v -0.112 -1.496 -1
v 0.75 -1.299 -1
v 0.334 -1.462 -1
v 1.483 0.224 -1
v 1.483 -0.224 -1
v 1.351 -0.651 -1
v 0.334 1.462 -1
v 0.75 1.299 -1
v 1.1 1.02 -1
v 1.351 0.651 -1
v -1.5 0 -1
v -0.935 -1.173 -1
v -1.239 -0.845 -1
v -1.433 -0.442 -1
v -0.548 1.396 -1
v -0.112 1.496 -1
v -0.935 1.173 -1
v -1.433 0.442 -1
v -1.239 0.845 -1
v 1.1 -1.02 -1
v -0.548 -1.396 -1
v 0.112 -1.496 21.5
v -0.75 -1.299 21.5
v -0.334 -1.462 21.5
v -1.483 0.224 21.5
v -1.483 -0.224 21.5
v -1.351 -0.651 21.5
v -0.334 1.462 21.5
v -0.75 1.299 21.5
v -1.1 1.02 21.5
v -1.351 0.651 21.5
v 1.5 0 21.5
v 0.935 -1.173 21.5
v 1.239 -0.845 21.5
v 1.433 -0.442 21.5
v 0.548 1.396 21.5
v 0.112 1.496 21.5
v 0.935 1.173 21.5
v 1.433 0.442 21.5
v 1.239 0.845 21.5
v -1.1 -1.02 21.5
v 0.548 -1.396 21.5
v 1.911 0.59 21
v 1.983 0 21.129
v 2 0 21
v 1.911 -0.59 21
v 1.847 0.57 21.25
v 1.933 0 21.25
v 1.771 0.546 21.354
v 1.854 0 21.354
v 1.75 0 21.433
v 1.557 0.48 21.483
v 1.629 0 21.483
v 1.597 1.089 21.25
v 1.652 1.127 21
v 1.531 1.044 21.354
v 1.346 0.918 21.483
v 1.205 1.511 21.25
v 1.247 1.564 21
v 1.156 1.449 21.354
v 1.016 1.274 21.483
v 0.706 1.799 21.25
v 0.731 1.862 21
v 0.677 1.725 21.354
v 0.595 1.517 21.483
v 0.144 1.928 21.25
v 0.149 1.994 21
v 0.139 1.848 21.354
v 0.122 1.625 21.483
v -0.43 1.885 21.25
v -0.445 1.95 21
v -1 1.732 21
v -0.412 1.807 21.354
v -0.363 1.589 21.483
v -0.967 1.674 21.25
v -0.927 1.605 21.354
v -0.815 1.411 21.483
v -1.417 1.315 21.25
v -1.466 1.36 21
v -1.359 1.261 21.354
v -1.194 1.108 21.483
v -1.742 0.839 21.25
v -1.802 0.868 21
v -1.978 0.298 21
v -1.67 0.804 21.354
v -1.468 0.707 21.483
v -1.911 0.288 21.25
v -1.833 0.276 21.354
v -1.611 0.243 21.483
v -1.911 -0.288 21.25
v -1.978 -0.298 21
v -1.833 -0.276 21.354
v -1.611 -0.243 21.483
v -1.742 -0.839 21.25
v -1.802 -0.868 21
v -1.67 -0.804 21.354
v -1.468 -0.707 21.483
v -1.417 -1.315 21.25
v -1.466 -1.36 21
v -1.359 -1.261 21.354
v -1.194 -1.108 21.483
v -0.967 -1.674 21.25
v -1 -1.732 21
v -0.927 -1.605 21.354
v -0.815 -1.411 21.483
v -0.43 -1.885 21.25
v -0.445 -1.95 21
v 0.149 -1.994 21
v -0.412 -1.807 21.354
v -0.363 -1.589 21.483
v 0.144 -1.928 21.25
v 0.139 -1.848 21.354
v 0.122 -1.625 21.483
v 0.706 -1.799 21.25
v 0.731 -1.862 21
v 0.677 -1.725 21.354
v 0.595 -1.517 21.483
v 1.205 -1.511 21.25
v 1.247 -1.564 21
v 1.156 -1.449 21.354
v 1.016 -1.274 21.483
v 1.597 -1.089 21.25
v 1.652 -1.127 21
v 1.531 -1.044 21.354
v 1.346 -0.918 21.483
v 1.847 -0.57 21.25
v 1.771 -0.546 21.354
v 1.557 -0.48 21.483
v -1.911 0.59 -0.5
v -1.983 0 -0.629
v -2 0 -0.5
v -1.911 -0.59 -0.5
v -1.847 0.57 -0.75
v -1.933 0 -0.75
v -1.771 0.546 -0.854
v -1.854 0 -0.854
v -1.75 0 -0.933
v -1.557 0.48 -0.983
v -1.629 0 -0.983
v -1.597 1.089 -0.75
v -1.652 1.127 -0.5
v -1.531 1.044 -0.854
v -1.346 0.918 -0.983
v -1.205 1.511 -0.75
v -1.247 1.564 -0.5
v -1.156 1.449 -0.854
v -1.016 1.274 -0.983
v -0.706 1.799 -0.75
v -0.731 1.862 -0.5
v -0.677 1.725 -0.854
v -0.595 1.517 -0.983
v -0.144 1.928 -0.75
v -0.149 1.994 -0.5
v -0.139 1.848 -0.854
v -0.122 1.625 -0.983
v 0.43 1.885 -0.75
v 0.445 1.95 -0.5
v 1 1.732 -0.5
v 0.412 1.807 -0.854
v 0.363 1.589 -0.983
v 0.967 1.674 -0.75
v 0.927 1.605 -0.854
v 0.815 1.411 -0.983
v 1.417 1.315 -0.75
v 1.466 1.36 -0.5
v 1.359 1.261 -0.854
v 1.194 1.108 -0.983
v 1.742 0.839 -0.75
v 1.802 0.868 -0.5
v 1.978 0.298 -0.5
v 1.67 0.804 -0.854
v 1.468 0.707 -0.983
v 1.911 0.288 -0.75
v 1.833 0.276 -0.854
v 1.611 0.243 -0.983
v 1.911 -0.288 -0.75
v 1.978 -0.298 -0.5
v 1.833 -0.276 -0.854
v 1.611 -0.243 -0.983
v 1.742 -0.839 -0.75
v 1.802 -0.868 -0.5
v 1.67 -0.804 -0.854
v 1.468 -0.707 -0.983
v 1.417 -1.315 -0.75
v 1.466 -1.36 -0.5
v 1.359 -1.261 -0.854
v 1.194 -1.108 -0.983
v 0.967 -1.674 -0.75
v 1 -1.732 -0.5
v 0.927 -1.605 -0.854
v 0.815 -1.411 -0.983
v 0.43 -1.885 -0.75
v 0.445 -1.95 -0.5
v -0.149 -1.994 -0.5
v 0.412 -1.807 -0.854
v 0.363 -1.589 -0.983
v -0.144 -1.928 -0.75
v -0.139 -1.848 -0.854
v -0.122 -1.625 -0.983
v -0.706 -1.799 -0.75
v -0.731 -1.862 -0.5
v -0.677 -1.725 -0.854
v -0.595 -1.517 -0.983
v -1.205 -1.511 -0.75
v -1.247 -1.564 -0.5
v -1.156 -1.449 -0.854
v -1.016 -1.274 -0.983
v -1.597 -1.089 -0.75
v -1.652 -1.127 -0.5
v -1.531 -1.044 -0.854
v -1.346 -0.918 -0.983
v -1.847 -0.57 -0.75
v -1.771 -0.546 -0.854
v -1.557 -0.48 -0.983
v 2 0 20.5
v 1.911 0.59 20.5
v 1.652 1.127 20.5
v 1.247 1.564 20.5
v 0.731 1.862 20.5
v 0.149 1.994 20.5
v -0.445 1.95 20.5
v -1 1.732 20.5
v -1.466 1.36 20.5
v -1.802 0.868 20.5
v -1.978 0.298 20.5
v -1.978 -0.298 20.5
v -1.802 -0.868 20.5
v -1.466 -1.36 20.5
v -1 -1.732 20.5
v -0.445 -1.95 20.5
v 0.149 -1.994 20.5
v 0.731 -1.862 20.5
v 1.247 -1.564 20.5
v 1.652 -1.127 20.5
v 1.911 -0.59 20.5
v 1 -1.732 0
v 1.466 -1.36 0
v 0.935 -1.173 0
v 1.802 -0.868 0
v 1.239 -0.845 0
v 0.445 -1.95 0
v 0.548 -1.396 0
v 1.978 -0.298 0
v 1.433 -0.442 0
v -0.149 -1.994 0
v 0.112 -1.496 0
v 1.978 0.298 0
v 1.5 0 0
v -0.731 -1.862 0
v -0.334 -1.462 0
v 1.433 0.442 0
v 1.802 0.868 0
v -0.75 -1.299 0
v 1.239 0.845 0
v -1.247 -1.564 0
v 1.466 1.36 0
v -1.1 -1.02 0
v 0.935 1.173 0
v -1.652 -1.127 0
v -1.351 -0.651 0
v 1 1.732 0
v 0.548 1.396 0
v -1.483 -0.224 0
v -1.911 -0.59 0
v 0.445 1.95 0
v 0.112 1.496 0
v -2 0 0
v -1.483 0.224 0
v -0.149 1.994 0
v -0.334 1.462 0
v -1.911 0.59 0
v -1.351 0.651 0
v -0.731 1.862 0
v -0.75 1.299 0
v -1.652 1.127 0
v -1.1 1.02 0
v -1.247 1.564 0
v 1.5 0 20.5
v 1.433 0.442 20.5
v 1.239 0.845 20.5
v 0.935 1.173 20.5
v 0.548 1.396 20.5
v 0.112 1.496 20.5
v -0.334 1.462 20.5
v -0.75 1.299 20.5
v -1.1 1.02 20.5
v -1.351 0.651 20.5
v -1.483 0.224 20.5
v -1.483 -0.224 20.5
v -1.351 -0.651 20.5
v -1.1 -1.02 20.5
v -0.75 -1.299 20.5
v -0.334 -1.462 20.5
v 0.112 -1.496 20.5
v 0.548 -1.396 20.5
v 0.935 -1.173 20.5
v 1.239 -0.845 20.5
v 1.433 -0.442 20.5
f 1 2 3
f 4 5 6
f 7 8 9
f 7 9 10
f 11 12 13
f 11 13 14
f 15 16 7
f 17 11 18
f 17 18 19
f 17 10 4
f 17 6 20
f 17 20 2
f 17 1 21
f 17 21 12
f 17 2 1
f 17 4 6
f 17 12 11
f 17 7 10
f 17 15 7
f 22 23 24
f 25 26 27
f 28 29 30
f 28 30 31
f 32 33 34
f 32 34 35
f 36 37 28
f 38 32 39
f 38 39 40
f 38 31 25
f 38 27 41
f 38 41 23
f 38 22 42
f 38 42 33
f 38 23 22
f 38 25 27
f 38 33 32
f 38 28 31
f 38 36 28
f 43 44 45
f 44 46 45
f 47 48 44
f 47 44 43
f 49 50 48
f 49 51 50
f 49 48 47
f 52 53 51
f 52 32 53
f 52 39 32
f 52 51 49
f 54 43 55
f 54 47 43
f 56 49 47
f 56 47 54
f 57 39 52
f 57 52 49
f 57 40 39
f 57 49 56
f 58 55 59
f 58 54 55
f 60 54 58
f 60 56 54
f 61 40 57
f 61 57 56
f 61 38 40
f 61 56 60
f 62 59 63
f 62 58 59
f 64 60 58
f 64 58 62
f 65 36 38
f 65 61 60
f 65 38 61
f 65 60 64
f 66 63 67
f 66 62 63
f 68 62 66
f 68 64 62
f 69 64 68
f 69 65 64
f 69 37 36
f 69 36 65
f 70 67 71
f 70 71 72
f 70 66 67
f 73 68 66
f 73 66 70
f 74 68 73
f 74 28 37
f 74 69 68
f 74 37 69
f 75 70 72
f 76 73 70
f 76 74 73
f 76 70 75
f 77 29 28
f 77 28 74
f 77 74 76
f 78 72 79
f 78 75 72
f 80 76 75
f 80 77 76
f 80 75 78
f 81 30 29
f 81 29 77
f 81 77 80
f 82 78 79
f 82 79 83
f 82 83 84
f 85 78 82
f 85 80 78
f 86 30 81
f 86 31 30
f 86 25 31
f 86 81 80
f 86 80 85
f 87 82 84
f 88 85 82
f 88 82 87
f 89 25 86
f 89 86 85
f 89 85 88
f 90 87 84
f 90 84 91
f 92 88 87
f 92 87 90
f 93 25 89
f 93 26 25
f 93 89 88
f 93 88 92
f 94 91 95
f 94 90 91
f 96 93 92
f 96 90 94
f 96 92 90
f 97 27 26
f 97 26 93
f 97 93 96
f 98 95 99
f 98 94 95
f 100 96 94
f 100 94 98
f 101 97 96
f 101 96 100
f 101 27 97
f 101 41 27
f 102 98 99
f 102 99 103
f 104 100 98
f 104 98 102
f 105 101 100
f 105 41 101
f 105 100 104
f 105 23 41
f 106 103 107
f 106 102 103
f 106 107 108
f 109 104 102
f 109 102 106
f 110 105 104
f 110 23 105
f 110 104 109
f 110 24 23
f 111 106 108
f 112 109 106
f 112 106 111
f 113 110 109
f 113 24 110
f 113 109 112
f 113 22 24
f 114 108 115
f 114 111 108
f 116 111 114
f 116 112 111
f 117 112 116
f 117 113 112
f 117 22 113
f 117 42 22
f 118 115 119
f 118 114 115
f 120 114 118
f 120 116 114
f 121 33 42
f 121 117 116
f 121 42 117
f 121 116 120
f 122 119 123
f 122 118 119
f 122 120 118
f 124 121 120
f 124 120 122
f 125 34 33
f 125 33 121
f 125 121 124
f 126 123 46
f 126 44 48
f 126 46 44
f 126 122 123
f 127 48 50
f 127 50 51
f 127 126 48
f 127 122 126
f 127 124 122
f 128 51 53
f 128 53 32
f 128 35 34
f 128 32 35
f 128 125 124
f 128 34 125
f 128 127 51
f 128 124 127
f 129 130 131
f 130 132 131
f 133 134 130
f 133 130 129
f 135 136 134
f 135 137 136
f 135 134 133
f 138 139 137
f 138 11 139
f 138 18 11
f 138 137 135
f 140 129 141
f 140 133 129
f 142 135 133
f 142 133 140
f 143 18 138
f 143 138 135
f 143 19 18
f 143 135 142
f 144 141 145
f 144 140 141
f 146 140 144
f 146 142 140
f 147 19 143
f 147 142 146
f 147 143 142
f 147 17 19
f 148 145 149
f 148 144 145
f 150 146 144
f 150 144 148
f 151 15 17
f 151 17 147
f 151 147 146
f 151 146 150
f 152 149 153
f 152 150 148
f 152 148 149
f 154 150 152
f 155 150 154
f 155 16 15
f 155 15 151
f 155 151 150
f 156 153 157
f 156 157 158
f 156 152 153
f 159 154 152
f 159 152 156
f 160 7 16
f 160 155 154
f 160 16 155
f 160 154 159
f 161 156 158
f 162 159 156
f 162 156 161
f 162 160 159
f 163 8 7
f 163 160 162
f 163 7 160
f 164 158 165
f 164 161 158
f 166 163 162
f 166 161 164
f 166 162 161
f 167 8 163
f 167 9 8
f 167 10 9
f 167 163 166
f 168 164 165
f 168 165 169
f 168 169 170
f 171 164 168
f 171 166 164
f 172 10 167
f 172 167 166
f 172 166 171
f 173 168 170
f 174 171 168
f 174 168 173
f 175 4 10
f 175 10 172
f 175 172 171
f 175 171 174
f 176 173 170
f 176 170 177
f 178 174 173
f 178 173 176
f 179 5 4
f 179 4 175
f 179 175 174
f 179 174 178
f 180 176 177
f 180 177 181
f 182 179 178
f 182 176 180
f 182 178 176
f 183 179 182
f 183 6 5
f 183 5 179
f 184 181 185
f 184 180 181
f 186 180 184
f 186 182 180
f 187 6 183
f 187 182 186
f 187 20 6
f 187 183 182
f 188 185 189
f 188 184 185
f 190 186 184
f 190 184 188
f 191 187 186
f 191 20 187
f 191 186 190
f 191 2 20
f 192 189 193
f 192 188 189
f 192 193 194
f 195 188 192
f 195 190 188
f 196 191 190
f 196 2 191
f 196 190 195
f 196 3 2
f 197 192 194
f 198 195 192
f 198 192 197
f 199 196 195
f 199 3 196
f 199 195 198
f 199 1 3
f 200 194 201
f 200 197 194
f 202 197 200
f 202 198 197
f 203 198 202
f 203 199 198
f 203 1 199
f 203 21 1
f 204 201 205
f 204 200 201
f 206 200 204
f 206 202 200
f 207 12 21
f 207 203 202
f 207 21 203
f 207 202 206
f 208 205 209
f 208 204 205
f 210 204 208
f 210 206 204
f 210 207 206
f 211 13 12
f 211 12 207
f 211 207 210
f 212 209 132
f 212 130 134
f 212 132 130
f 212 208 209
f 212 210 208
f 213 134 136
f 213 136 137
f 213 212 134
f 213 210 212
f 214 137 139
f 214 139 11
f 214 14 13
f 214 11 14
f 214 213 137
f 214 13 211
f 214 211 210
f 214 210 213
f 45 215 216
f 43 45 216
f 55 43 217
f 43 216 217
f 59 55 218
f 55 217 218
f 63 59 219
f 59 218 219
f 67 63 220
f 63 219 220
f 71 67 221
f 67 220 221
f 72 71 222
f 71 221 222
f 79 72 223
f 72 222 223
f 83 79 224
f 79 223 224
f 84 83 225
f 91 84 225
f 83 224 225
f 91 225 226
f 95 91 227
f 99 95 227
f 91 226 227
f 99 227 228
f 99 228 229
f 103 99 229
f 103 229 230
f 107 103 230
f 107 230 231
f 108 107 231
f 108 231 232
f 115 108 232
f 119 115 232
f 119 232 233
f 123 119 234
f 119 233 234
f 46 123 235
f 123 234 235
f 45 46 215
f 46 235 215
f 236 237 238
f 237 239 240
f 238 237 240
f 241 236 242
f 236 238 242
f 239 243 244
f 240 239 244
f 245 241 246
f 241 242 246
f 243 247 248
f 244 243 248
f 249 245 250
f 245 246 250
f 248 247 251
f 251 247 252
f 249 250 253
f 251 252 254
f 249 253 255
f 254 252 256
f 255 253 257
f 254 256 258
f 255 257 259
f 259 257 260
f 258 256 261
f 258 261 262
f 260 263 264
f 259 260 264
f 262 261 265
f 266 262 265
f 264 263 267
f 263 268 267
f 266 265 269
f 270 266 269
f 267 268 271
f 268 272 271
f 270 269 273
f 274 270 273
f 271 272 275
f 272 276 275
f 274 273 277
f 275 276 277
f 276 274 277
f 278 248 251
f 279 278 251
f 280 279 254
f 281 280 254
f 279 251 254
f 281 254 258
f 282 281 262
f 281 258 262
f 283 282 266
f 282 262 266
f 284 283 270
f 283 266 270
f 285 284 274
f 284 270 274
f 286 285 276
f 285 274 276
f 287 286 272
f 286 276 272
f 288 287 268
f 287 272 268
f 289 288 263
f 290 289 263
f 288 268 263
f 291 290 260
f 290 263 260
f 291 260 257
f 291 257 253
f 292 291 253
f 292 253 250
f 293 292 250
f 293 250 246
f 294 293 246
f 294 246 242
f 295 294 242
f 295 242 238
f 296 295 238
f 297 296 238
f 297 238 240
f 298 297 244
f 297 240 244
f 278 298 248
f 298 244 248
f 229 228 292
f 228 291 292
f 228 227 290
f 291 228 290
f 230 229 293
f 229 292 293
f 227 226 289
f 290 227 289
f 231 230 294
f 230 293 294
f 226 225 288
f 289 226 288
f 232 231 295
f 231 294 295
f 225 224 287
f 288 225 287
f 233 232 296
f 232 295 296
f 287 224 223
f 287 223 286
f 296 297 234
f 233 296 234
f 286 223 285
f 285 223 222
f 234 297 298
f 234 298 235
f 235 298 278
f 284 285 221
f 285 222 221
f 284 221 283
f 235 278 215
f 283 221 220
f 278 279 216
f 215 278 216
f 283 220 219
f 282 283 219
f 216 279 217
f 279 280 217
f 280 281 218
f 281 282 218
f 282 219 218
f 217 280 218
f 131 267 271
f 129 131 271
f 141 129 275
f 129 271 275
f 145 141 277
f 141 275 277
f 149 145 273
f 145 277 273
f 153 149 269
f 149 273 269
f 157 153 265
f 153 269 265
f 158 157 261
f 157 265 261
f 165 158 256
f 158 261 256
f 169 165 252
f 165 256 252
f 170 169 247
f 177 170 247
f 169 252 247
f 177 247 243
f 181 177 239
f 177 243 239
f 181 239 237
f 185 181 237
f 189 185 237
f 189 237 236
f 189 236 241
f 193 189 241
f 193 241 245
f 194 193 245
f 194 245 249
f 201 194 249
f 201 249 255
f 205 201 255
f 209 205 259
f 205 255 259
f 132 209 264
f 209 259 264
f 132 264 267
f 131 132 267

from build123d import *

# Parameters (mm, degrees)
SKETCH1_R           = 1.5
BOSS_EXTRUDE1_DEPTH = 20.5
SKETCH2_R           = 2
BOSS_EXTRUDE2_DEPTH = 1
SKETCH3_R           = 2
BOSS_EXTRUDE3_DEPTH = 1
FILLET1_R           = 0.5


with BuildPart() as part:
    # Sketch1 → Boss-Extrude1 (new body)
    with BuildSketch(Plane.XY):
        Circle(SKETCH1_R)
    extrude(amount=BOSS_EXTRUDE1_DEPTH)

    # Sketch2 → Boss-Extrude2 (add)
    with BuildSketch(Plane(origin=(0, 0, 0), x_dir=(-1, 0, 0), z_dir=(0, 0, -1))):
        Circle(SKETCH2_R)
    extrude(amount=BOSS_EXTRUDE2_DEPTH)

    # Sketch3 → Boss-Extrude3 (add)
    with BuildSketch(Plane.XY.offset(20.5)):
        Circle(SKETCH3_R)
    extrude(amount=BOSS_EXTRUDE3_DEPTH)

    # Fillet1
    fillet1_edges = [part.edges().sort_by_distance(p)[0] for p in [
        (-2, 0, 21.5),
        (2, 0, -1),
    ]]
    fillet(fillet1_edges, radius=FILLET1_R)


solid = part.part
